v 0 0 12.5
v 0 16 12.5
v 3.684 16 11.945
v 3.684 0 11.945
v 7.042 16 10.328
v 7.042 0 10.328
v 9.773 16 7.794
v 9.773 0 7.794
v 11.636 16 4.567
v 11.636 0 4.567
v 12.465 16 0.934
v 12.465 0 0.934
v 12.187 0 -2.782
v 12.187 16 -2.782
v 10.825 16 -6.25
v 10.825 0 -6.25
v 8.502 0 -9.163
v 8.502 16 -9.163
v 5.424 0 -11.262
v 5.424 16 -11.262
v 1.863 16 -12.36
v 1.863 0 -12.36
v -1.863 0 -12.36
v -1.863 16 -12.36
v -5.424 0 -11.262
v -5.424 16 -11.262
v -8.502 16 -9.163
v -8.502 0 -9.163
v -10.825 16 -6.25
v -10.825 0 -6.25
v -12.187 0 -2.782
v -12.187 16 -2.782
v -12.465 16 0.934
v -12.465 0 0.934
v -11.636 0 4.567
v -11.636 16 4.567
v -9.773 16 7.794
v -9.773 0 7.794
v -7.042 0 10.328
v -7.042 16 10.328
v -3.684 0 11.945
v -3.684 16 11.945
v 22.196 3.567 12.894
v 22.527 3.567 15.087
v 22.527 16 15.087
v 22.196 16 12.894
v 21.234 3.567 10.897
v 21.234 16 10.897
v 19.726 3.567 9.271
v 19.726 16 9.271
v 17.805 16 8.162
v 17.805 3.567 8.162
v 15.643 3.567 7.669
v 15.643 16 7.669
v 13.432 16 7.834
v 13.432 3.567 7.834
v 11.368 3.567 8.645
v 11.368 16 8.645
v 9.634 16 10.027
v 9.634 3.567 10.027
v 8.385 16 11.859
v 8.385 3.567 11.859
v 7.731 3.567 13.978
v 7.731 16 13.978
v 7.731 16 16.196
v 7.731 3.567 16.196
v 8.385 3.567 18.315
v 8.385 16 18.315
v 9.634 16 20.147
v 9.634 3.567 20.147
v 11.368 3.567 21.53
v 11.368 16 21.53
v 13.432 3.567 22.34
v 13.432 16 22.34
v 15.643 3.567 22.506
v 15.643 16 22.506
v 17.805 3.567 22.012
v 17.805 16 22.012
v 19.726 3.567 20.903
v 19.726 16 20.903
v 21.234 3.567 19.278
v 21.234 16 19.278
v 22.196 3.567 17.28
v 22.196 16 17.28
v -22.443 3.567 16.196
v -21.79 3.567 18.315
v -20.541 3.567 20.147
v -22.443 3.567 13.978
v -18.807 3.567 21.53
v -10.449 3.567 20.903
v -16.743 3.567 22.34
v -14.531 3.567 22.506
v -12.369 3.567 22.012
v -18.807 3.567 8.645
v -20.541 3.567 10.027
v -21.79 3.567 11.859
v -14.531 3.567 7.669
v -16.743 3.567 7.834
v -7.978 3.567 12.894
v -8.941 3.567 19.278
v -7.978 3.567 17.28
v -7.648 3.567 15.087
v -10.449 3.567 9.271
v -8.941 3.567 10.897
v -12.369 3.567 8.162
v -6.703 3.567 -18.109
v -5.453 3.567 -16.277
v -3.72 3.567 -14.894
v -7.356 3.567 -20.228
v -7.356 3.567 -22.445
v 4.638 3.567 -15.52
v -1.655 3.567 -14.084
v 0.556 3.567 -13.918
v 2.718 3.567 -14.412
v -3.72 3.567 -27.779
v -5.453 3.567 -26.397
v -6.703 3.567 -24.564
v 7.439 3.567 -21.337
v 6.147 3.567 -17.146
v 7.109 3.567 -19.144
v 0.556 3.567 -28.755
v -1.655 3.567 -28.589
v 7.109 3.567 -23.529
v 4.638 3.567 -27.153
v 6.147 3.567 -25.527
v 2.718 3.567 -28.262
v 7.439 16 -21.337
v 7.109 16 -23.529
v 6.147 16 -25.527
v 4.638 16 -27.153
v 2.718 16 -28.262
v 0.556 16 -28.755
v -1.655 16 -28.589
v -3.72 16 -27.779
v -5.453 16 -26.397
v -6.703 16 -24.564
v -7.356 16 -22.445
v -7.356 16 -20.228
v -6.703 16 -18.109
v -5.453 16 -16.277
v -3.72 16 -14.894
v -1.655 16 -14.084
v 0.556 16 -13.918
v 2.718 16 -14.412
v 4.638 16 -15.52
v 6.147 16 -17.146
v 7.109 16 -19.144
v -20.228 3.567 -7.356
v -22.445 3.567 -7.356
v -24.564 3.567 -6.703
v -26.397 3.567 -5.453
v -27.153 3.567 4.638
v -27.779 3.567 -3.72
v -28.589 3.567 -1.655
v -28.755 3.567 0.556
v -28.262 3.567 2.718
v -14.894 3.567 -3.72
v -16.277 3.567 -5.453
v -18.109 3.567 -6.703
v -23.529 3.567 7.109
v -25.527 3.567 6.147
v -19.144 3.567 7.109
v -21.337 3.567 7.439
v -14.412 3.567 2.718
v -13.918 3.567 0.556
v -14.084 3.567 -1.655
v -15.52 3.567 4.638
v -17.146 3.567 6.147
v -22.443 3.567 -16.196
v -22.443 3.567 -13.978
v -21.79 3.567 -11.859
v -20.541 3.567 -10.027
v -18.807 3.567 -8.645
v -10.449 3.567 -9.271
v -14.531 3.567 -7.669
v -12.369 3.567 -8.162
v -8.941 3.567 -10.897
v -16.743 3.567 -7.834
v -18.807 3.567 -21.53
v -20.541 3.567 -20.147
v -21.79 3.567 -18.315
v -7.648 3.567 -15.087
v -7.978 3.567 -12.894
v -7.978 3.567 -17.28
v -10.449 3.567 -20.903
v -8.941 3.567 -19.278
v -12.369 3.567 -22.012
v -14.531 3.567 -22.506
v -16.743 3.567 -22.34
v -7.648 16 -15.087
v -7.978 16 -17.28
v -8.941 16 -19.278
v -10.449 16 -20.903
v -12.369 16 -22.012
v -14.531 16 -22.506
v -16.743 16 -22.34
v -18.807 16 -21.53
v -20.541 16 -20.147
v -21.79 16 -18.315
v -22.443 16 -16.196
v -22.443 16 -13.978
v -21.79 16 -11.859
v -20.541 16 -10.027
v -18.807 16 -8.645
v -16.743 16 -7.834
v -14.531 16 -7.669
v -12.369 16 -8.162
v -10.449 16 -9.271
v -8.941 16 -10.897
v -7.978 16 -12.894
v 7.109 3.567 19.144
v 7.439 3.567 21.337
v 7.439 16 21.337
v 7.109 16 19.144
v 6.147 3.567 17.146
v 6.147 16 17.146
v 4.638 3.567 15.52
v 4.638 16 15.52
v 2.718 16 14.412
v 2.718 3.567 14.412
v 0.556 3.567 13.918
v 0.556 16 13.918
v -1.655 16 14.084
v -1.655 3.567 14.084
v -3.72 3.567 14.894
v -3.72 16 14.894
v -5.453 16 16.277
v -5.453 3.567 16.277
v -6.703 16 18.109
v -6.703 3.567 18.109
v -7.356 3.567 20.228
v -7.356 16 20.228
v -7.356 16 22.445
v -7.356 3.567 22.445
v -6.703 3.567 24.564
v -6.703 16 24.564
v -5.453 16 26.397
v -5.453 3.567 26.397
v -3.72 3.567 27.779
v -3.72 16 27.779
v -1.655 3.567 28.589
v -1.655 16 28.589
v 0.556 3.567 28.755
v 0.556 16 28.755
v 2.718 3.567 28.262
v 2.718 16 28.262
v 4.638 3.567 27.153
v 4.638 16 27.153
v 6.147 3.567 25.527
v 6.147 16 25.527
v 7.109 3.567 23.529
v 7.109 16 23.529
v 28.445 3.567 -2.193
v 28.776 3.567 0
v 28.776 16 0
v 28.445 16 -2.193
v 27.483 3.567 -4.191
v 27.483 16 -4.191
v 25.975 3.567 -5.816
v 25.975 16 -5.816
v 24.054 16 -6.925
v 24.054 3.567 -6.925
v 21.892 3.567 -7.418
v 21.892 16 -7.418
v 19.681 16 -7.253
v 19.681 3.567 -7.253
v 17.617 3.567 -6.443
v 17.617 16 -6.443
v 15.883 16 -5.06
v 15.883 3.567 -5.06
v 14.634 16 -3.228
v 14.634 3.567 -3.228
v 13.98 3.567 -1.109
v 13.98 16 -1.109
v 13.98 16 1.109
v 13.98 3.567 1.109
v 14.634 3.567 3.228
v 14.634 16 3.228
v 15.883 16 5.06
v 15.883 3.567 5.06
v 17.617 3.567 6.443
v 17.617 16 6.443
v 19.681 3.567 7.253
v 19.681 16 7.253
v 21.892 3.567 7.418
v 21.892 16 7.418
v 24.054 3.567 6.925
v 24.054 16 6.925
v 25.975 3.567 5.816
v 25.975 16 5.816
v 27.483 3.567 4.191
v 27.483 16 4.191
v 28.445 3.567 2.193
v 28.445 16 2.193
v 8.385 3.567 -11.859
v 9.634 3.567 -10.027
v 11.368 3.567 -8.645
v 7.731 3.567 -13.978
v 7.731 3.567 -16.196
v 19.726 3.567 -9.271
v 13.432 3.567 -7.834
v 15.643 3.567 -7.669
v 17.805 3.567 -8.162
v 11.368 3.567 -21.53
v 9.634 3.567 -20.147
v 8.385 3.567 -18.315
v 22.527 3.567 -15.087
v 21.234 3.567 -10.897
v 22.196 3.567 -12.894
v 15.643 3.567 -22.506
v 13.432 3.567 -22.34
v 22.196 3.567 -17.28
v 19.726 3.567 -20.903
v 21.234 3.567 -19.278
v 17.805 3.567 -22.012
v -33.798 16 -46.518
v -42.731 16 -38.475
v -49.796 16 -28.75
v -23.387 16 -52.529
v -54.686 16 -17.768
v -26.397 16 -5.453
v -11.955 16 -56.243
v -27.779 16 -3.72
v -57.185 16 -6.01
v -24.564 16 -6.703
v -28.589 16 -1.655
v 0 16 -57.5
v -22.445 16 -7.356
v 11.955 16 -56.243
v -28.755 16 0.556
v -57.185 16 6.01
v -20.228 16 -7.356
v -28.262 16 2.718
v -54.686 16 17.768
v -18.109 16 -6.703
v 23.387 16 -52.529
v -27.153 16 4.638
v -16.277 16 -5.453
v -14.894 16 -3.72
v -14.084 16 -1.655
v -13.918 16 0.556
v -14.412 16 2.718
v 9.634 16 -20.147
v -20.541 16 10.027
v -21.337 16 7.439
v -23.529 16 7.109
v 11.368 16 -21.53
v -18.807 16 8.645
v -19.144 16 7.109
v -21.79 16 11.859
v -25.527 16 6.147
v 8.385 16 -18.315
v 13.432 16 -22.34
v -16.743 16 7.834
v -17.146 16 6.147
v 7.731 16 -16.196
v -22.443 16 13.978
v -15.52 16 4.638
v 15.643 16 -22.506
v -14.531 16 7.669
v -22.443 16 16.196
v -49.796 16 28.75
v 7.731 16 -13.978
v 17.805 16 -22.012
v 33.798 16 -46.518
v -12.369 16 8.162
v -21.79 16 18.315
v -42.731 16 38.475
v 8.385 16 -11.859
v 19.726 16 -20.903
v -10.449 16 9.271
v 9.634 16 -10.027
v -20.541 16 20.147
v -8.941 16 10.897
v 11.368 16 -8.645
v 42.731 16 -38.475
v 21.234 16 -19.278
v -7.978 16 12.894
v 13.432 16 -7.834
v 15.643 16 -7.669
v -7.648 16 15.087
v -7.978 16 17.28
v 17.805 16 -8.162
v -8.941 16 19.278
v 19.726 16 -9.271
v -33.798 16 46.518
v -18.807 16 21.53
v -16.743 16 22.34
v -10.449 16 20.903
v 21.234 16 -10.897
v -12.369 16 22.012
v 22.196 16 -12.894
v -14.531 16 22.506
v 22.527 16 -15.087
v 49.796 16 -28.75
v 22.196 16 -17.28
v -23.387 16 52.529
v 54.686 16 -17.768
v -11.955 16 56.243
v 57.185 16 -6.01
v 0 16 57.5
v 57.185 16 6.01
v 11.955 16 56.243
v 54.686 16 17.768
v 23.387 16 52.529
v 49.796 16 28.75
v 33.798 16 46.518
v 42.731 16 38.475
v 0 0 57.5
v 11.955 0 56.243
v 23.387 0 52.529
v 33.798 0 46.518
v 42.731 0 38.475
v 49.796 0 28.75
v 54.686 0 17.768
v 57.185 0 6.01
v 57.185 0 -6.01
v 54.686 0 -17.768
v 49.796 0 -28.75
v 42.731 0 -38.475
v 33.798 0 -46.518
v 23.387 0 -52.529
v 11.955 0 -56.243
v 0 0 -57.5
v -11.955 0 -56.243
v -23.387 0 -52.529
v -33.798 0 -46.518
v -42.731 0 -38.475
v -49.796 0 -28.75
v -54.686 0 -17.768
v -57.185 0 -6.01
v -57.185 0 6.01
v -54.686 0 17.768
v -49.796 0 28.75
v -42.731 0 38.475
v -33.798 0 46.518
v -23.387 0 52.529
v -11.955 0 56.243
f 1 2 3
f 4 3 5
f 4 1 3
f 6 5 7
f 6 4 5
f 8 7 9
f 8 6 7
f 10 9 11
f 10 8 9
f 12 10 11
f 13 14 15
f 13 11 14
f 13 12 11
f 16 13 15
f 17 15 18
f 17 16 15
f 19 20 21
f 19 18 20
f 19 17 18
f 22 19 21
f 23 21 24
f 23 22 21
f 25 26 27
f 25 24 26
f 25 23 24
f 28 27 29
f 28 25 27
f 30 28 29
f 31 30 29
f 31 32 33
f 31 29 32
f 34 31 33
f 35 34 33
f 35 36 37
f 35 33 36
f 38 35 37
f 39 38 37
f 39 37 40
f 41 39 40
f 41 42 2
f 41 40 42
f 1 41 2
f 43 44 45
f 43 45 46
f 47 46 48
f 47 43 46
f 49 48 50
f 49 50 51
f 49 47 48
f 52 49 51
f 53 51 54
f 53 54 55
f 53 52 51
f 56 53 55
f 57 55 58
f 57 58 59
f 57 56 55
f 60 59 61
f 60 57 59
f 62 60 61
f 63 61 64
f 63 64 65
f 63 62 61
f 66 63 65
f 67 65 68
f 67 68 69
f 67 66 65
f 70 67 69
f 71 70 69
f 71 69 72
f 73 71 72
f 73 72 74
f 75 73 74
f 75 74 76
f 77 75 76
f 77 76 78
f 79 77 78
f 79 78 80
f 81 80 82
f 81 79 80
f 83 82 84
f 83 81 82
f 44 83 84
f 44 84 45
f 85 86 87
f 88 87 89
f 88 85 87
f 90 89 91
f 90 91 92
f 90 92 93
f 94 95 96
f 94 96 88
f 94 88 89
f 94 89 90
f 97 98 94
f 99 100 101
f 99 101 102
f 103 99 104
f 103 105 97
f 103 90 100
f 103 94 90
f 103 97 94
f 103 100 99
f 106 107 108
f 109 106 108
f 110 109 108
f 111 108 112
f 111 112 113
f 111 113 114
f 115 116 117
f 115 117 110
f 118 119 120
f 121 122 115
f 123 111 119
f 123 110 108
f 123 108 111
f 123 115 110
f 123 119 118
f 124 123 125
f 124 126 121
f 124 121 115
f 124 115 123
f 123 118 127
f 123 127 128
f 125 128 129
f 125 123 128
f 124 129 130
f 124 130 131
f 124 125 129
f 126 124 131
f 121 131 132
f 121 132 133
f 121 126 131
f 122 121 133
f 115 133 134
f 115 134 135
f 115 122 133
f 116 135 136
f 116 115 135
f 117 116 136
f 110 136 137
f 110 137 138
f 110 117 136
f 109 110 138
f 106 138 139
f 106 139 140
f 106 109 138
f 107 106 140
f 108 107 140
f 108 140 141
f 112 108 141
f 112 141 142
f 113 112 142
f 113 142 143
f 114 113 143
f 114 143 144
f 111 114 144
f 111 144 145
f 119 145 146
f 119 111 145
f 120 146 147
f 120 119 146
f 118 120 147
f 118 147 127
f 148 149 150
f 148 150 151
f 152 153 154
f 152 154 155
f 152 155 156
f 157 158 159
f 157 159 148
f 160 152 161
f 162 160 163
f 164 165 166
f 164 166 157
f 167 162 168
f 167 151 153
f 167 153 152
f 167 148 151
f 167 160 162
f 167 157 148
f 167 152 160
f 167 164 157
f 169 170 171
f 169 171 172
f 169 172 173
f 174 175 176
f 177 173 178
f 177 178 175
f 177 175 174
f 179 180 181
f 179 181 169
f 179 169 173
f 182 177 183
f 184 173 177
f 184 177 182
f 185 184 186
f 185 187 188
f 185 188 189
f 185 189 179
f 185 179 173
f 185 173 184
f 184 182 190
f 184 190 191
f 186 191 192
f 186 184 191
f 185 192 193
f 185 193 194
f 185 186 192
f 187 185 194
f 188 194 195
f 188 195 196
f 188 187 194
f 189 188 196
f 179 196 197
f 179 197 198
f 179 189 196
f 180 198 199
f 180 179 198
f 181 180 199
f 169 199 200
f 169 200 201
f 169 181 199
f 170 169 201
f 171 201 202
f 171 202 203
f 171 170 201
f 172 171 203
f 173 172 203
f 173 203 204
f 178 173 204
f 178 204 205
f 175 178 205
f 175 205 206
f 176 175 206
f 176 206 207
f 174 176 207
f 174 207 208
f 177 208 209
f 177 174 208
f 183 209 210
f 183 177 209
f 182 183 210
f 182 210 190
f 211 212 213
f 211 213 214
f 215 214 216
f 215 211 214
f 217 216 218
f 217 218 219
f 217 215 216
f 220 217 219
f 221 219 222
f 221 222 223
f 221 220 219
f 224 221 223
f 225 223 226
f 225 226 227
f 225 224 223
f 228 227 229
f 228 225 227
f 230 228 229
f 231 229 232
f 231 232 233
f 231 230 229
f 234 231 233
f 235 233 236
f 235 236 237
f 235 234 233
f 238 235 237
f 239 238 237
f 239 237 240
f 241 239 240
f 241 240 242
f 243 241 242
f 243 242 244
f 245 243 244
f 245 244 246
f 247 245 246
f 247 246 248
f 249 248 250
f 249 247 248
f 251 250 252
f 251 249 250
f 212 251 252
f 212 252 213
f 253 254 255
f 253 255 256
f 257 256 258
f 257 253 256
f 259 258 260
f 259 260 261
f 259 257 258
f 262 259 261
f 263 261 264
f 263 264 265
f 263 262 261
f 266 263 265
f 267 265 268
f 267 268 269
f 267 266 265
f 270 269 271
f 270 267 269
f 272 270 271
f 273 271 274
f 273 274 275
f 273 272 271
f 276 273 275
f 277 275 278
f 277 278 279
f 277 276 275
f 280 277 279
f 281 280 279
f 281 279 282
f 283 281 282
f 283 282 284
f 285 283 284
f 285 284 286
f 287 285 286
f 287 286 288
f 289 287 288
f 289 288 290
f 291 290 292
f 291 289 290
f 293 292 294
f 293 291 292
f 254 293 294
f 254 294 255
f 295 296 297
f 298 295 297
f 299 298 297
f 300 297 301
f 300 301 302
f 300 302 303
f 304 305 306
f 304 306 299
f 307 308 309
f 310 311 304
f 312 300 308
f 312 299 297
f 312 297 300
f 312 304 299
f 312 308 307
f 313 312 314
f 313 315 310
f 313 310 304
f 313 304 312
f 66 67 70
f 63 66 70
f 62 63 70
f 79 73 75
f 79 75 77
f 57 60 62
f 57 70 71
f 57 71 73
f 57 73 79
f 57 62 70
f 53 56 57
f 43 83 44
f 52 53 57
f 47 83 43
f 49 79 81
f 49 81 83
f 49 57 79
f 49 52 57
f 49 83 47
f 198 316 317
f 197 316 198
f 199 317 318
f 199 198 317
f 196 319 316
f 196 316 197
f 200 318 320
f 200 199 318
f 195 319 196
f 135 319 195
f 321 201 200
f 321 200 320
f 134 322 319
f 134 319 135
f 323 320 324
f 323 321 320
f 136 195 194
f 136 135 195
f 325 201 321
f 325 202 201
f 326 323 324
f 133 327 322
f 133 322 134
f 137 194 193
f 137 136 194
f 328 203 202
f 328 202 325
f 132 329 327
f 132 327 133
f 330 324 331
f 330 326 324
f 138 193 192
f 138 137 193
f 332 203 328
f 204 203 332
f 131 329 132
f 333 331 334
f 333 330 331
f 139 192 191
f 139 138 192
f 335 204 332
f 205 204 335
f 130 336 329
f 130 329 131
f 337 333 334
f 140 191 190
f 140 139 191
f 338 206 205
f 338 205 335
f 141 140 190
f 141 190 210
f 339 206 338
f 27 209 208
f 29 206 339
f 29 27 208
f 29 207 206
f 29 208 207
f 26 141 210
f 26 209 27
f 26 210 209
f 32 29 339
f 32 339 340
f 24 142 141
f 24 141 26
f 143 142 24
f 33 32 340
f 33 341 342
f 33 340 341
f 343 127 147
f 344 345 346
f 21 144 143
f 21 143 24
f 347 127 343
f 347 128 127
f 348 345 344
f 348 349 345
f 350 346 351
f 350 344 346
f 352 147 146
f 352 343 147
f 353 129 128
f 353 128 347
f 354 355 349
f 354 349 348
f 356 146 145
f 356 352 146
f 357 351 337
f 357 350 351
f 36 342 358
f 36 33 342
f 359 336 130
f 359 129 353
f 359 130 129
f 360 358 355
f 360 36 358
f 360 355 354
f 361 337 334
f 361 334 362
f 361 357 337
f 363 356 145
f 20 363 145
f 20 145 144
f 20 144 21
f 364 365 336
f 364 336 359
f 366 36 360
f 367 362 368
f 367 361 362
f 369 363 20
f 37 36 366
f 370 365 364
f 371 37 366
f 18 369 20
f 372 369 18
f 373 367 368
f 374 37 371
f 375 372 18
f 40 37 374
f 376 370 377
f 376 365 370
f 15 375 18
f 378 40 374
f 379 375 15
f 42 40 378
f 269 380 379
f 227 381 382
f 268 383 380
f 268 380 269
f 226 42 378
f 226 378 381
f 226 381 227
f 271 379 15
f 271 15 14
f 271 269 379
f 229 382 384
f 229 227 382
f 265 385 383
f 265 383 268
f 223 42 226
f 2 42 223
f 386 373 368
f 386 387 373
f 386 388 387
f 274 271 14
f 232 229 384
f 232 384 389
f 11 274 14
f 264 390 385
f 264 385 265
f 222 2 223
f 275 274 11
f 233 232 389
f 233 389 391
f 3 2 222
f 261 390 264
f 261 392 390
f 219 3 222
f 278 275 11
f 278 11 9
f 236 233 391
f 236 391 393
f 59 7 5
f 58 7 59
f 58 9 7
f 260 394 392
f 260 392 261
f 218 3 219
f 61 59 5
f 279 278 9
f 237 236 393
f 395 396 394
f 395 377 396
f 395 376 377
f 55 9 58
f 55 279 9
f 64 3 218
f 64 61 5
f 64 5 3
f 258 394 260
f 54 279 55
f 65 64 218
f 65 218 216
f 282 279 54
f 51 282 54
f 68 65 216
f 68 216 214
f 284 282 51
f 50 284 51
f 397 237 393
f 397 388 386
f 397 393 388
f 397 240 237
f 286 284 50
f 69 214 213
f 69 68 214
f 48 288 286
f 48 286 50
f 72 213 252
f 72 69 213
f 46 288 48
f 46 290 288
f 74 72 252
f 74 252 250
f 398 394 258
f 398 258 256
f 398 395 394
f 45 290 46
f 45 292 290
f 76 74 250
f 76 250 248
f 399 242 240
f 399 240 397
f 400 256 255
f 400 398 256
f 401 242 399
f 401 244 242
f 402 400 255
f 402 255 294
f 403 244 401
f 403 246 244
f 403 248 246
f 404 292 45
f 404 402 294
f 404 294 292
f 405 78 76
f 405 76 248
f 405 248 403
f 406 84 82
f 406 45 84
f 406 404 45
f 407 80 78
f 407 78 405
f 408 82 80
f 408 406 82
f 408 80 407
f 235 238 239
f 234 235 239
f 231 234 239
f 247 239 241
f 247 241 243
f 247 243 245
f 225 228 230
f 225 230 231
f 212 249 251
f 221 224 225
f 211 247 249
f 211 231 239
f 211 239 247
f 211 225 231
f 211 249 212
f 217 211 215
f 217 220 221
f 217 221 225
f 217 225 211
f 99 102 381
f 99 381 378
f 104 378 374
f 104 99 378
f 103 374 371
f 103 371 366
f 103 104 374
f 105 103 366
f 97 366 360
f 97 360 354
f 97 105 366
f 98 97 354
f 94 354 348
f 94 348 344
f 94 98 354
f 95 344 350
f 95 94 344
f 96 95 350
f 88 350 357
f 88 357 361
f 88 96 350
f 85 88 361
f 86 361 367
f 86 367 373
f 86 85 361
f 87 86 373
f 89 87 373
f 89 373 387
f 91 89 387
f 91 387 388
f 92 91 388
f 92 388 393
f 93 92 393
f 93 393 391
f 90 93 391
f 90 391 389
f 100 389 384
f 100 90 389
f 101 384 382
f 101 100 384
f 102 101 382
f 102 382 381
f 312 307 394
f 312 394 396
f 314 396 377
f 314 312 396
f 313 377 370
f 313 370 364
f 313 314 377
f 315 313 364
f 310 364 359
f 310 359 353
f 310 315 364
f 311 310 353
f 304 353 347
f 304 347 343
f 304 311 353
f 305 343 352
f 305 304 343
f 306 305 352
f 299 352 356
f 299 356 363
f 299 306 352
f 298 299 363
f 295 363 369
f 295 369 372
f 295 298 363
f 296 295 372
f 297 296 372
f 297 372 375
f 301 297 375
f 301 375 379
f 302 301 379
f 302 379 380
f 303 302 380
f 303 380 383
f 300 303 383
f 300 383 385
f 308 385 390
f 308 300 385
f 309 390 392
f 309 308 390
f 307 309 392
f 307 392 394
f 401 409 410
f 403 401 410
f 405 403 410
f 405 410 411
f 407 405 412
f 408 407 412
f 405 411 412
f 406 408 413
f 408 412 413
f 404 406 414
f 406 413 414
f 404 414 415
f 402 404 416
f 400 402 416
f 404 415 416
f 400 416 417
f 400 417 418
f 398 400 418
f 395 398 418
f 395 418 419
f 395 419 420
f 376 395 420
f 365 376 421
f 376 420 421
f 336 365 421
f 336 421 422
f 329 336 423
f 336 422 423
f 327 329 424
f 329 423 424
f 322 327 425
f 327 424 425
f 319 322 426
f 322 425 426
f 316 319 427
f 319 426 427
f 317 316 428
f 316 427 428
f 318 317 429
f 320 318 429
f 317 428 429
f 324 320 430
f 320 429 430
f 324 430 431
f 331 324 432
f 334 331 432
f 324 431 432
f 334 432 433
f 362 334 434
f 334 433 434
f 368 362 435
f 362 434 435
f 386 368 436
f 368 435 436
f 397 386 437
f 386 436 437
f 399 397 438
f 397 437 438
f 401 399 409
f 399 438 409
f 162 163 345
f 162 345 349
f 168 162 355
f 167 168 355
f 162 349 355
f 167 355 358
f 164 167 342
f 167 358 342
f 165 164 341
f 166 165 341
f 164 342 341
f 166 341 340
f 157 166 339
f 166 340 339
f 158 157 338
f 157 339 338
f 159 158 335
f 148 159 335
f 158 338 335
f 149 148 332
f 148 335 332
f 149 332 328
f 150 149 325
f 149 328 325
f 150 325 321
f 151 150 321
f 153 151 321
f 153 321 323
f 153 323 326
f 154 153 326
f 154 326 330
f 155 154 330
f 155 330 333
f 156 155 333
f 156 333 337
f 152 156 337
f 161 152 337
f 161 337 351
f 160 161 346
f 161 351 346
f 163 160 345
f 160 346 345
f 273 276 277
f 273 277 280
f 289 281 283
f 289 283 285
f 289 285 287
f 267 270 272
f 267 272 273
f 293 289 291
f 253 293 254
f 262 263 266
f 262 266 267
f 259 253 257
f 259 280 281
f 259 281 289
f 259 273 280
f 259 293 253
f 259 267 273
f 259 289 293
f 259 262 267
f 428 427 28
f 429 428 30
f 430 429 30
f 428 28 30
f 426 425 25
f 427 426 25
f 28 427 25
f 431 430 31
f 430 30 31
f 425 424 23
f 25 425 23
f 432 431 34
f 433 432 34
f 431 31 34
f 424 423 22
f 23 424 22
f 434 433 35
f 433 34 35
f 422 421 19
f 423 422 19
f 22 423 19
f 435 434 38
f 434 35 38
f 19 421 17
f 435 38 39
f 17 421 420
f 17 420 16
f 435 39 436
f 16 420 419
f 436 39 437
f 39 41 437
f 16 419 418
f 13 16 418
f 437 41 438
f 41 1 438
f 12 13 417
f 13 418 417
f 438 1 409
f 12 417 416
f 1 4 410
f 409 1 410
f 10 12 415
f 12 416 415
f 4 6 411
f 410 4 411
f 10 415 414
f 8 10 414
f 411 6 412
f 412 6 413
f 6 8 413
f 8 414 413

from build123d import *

# Parameters (mm, degrees)
SKETCH1_R           = 57.5
BOSS_EXTRUDE1_DEPTH = 16
SKETCH2_R           = 12.5
CUT_EXTRUDE1_DEPTH  = 83.876414015
SKETCH3_R           = 7.439291055
CUT_EXTRUDE2_DEPTH  = 12.432982932
CIRPATTERN1_COUNT   = 8


with BuildPart() as part:
    # Sketch1 → Boss-Extrude1 (new body)
    with BuildSketch(Plane(origin=(0, 0, 0), x_dir=(1, 0, 0), z_dir=(0, 1, 0))):
        Circle(SKETCH1_R)
    extrude(amount=BOSS_EXTRUDE1_DEPTH)

    # Sketch2 → Cut-Extrude1 (cut, through all)
    with BuildSketch(Plane(origin=(0, 0, 0), x_dir=(1, 0, 0), z_dir=(0, 1, 0))):
        Circle(SKETCH2_R)
    extrude(amount=CUT_EXTRUDE1_DEPTH, mode=Mode.SUBTRACT)

    # Sketch3 → Cut-Extrude2 (cut)
    with BuildSketch(Plane(origin=(0, 16, 0), x_dir=(1, 0, 0), z_dir=(0, 1, 0))):
        with Locations((-21.336549902, 0)):
            Circle(SKETCH3_R)
    cut_extrude2 = extrude(amount=-CUT_EXTRUDE2_DEPTH, mode=Mode.SUBTRACT)

    # CirPattern1: Cut-Extrude2 ×8 about axis
    cirpattern1_axis = Axis((0, 0, 0), (0, 1, 0))
    for i in range(1, CIRPATTERN1_COUNT):
        add(cut_extrude2.rotate(cirpattern1_axis, i * 360 / CIRPATTERN1_COUNT), mode=Mode.SUBTRACT)


solid = part.part
